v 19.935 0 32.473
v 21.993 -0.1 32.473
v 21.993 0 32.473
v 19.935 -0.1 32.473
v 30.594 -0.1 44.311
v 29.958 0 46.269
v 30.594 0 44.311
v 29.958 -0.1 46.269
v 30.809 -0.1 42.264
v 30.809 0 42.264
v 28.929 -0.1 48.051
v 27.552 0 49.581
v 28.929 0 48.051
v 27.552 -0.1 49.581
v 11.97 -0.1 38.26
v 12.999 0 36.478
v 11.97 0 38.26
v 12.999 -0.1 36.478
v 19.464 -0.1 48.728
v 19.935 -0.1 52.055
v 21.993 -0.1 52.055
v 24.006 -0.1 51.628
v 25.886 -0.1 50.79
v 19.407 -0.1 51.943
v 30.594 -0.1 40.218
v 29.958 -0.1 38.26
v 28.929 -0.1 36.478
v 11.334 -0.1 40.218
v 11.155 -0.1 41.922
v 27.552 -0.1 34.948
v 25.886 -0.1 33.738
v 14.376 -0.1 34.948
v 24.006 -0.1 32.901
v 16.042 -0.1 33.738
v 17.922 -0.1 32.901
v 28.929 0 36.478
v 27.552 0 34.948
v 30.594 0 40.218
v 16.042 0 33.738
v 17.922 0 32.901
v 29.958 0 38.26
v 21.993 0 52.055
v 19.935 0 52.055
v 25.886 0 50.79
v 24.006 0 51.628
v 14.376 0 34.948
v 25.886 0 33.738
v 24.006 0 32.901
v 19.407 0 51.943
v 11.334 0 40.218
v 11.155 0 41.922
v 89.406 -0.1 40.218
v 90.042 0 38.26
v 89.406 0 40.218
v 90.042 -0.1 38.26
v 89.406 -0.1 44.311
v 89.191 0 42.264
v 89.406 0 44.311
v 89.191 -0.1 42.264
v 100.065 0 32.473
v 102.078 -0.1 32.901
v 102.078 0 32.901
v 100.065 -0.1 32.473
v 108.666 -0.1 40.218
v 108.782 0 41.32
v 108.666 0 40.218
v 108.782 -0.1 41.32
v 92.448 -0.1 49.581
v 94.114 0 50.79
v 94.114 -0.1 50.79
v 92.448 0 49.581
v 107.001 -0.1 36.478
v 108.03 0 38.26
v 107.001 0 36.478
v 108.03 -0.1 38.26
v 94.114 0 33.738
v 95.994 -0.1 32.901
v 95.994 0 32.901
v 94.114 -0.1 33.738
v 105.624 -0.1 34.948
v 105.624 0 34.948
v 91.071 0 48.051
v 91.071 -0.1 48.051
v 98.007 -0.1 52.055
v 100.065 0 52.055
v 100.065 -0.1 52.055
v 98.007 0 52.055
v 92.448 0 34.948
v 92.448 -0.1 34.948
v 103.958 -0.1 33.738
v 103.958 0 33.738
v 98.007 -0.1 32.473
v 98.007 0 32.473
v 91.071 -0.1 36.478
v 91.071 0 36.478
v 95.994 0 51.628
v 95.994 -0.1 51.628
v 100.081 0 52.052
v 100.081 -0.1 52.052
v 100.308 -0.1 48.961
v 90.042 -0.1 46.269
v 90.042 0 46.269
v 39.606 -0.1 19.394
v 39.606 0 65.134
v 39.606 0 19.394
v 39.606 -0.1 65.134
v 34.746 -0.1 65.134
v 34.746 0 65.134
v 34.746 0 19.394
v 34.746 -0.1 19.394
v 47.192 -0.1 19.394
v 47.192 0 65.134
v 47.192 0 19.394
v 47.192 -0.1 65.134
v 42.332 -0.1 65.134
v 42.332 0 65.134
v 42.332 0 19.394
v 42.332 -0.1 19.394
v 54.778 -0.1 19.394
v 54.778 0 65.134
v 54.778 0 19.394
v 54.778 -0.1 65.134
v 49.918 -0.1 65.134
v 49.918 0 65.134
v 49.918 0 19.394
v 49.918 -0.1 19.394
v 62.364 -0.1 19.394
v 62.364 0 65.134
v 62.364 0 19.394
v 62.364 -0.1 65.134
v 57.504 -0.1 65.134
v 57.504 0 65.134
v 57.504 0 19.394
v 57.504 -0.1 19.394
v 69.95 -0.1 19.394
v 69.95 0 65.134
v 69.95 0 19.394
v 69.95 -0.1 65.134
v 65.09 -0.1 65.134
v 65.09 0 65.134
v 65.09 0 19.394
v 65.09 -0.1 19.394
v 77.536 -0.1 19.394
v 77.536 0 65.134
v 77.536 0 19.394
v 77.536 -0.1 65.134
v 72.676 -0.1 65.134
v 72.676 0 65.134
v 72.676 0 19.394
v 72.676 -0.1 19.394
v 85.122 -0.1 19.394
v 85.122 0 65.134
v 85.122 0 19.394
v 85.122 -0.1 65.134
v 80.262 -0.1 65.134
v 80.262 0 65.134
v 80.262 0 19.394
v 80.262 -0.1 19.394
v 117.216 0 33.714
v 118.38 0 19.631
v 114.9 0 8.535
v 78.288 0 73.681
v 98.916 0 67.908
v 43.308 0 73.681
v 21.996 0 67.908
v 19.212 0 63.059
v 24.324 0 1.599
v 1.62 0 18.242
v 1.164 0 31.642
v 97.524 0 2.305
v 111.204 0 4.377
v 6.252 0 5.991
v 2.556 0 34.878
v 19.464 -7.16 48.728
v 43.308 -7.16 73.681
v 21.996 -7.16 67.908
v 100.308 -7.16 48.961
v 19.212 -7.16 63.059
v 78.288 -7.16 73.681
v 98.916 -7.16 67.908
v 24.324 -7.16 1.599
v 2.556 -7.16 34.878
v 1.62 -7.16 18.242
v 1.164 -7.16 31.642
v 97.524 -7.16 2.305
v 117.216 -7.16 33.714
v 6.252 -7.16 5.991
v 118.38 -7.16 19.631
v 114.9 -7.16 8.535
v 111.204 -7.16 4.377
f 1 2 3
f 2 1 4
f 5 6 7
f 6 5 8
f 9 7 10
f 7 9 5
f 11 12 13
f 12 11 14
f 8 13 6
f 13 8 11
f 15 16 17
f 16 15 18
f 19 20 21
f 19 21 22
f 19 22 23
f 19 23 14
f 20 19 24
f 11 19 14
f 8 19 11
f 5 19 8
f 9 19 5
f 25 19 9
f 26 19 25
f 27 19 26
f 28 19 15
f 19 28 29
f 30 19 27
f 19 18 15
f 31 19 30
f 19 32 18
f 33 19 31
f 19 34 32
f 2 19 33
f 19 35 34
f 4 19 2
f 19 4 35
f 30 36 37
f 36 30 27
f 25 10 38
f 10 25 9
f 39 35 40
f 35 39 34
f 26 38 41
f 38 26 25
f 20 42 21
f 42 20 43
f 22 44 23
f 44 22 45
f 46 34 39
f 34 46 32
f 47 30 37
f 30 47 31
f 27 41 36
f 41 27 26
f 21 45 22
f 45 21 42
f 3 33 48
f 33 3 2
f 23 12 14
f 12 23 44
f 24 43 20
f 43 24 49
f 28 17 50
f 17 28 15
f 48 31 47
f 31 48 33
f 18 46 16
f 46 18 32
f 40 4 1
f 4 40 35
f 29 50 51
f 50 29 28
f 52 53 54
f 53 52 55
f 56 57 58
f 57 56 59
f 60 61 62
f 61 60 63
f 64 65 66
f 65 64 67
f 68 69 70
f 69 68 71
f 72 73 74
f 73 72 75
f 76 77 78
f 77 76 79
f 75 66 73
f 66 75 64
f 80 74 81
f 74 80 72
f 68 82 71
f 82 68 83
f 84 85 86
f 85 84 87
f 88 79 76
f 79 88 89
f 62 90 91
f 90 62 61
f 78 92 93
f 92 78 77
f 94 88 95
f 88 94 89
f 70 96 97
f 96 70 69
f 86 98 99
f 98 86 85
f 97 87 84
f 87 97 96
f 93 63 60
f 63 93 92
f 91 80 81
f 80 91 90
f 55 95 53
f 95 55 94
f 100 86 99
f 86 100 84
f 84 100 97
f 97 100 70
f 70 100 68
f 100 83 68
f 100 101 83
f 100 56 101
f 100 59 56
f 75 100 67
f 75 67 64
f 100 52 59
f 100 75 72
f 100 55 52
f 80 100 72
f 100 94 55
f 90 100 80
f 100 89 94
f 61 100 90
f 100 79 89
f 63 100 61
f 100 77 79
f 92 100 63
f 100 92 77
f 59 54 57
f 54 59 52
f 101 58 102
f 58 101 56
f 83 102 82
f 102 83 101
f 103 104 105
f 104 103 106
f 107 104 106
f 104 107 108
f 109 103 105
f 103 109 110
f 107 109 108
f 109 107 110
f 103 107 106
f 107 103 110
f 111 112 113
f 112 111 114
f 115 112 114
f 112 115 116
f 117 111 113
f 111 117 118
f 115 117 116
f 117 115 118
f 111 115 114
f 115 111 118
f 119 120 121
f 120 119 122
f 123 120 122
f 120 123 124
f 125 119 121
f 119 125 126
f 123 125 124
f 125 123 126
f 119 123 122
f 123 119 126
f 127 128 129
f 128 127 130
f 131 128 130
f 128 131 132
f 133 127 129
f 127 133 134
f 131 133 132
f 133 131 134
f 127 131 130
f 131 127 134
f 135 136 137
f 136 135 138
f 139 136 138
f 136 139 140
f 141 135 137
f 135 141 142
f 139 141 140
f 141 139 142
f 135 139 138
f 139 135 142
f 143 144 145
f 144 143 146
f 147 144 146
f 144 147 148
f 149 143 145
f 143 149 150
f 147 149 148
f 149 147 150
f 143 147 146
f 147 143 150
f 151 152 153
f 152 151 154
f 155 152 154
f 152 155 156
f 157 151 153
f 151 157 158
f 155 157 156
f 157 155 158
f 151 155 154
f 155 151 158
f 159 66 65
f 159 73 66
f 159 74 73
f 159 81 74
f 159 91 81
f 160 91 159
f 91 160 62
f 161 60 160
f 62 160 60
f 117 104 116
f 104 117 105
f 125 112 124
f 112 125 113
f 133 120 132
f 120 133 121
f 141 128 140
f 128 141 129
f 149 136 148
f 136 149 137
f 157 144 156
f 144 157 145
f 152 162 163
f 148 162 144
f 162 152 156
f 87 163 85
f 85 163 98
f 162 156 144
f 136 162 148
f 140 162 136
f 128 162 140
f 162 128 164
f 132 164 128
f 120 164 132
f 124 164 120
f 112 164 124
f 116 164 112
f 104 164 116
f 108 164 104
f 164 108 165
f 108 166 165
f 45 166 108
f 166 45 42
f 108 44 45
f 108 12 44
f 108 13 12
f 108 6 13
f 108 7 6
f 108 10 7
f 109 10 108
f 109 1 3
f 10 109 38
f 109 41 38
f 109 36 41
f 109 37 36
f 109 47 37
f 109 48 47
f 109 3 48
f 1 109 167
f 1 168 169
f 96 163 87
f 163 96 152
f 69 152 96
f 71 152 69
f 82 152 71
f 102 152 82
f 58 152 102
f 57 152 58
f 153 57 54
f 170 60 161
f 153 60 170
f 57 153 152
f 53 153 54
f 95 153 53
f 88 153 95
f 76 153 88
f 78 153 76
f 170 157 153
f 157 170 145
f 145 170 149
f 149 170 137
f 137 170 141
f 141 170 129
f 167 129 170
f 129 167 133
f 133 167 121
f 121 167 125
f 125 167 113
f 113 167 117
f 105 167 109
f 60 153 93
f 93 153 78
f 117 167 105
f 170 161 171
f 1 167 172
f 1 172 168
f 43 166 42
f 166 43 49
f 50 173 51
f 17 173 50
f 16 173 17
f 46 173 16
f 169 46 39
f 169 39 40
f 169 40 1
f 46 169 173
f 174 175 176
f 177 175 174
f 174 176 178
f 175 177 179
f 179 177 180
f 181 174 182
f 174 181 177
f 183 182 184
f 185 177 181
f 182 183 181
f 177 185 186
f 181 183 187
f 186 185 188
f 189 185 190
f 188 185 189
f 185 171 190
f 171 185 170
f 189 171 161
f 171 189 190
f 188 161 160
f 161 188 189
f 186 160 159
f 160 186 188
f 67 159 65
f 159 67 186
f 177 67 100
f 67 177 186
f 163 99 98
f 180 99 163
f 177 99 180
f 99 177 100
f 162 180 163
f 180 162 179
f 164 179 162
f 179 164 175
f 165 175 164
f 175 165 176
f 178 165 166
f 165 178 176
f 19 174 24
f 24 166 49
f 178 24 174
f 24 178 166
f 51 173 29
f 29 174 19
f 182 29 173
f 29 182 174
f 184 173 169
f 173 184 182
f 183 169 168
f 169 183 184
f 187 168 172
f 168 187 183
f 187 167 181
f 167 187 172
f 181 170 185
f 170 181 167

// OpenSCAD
/* doodle-meta {"version":1,"parameters":{"width":{"label":"Overall width","description":"Changes the body width","unit":"mm","feature":"body_width"},"height":{"label":"Overall height","description":"Changes the body height","unit":"mm","feature":"body_height"},"depth":{"label":"Overall depth","description":"Changes the body depth","unit":"mm","feature":"body_depth"},"slot_count":{"label":"Grille slot count","description":"Number of vertical grille slots","unit":"count","feature":"grille_slots"},"slot_width":{"label":"Grille slot width","description":"Width of each vertical grille slot","unit":"mm","feature":"grille_slots"},"slot_height":{"label":"Grille slot height","description":"Height of each vertical grille slot","unit":"mm","feature":"grille_slots"},"headlight_diameter":{"label":"Headlight diameter","description":"Diameter of the circular headlight cutouts","unit":"mm","feature":"headlights"}},"features":{"body_width":{"kind":"dimension","axis":"x","label":"Overall width"},"body_height":{"kind":"dimension","axis":"z","label":"Overall height"},"body_depth":{"kind":"dimension","axis":"y","label":"Overall depth"},"grille_slots":{"kind":"region","label":"Grille slots","min":[{"parameter":"width","scale":0.2895},{"parameter":"depth","scale":0,"offset":0},{"parameter":"height","scale":0.1324}],"max":[{"parameter":"width","scale":0.7027},{"parameter":"depth","scale":1,"offset":0},{"parameter":"height","scale":0.7417}]},"headlights":{"kind":"region","label":"Headlights","min":[{"parameter":"width","scale":0.0927},{"parameter":"depth","scale":0,"offset":0},{"parameter":"height","scale":0.4893}],"max":[{"parameter":"width","scale":0.9035},{"parameter":"depth","scale":1,"offset":0},{"parameter":"height","scale":0.7509}]}}} */

// Parameters
width = 120.0;
height = 75.07;
depth = 7.16;
slot_count = 7;
slot_width = 4.86;
slot_height = 45.74;
headlight_diameter = 19.69;

// Derived constants
eps = 0.1;

// Front view outer profile polygon (normalized u, v)
// Mapped to CAD: X = u * width, Z = (1 - v) * height
front_profile_norm = [
    [0.0097, 0.5785],
    [0.0135, 0.757],
    [0.0521, 0.9202],
    [0.2027, 0.9787],
    [0.8127, 0.9693],
    [0.9267, 0.9417],
    [0.9575, 0.8863],
    [0.9865, 0.7385],
    [0.9768, 0.5509],
    [0.8359, 0.3478],
    [0.8243, 0.0954],
    [0.6524, 0.0185],
    [0.3609, 0.0185],
    [0.1833, 0.0954],
    [0.1601, 0.16],
    [0.1622, 0.3509],
    [0.0213, 0.5354]
];

// Convert normalized front profile to CAD coordinates (X, Z)
function front_profile_cad(p) = [p[0] * width, (1 - p[1]) * height];

// Generate CAD polygon points
front_poly_cad = [for (p = front_profile_norm) front_profile_cad(p)];

// Top view outer profile polygon (normalized u, v)
// Mapped to CAD: X = u * width, Y = (1 - v) * depth
top_profile_norm = [
    [0.0096, 0.2255],
    [0.0115, 0.7086],
    [0.8944, 0.8064],
    [0.9732, 0.7725],
    [0.9866, 0.5469],
    [0.9789, 0.2255],
    [0.9501, 0.1597]
];

// Convert normalized top profile to CAD coordinates (X, Y)
function top_profile_cad(p) = [p[0] * width, (1 - p[1]) * depth];

// Generate CAD polygon points for top view
top_poly_cad = [for (p = top_profile_norm) top_profile_cad(p)];

// Headlight centers in CAD coordinates
// Left headlight: center_view_normalized [0.1747, 0.437]
// X = 0.1747 * width, Z = (1 - 0.437) * height
headlight_left_x = 0.1747 * width;
headlight_left_z = (1 - 0.437) * height;

// Right headlight: center_view_normalized [0.8253, 0.437]
// X = 0.8253 * width, Z = (1 - 0.437) * height
headlight_right_x = 0.8253 * width;
headlight_right_z = (1 - 0.437) * height;

// Grille slots parameters
// Slots are centered vertically in the front view.
// Center v = 0.437 -> Z_center = (1 - 0.437) * height
// Slot height is slot_height.
// Slot width is slot_width.
// Slots are distributed horizontally.
// The slots span from u=0.2895 to u=0.7027 roughly (based on bounding boxes of contours).
// Let's calculate the start and end X for the slot array.
// Leftmost slot center u ~ 0.3098, Rightmost slot center u ~ 0.6891.
// Spacing between centers: (0.6891 - 0.3098) / (7 - 1) = 0.3793 / 6 = 0.063216
// First slot center X = 0.3098 * width
// Last slot center X = 0.6891 * width

slot_start_u = 0.3098;
slot_end_u = 0.6891;
slot_pitch_u = (slot_end_u - slot_start_u) / (slot_count - 1);

// Module for the main body
module grille_body() {
    // Create the 3D body by extruding the front profile along Y
    // The front profile is in XZ plane. Extrude along Y.
    // We need to create a polygon in XZ and extrude it along Y.
    // However, OpenSCAD's linear_extrude works on XY plane by default.
    // So we create the polygon in XY (where X is width, Y is height), then rotate it to XZ.
    
    // Create polygon in XY plane (X=width, Y=height)
    // Points are (X, Z) from front_profile_cad
    // We need to map (X, Z) to (X, Y) for linear_extrude, then rotate.
    // Actually, simpler: define polygon in XZ directly by swapping Y/Z in the polygon definition?
    // No, polygon() takes 2D points.
    // Let's define the polygon in XZ coordinates as (x, z).
    // Then use linear_extrude with convexity and rotate the whole thing?
    // Or better: define polygon in XY where Y represents Z.
    // Then rotate([90, 0, 0]) to put it in XZ plane.
    
    // Points for polygon in XY (X, Y=Z)
    poly_pts = [for (p = front_poly_cad) [p[0], p[1]]];
    
    // Extrude along Z (which will become Y after rotation)
    // Wait, if I extrude along Z, the thickness is in Z.
    // I want thickness in Y.
    // So:
    // 1. Define polygon in XZ (x, z).
    // 2. linear_extrude along Y? No, linear_extrude is always along Z.
    // 3. So define polygon in XY (x, y=z).
    // 4. linear_extrude along Z (thickness).
    // 5. Rotate([90, 0, 0]) to swap Y and Z.
    //    Original: X=width, Y=height, Z=thickness.
    //    After rotate([90,0,0]): X=width, Y=-thickness, Z=height.
    //    This puts the face in XZ plane, thickness in Y.
    
    translate([0, 0, 0])
    rotate([90, 0, 0])
    linear_extrude(height = depth, convexity = 10)
    polygon(points = poly_pts);
}

// Module for headlight cutouts
module headlight_cutouts() {
    // Left headlight
    // Cylinder axis along Y.
    // Position: X = headlight_left_x, Z = headlight_left_z, Y = depth/2 (centered)
    // Rotate([90, 0, 0]) makes cylinder axis along Y.
    // Center the cylinder in Y.
    translate([headlight_left_x, depth/2, headlight_left_z])
    rotate([90, 0, 0])
    cylinder(h = depth + 2*eps, d = headlight_diameter, center = true);

    // Right headlight
    translate([headlight_right_x, depth/2, headlight_right_z])
    rotate([90, 0, 0])
    cylinder(h = depth + 2*eps, d = headlight_diameter, center = true);
}

// Module for grille slot cutouts
module grille_slot_cutouts() {
    // Slots are vertical rectangles in XZ plane, cut along Y.
    // Use cubes.
    // Cube dimensions: X=slot_width, Y=depth+2*eps, Z=slot_height.
    // Centered in Y.
    // Positioned at specific X and Z.
    
    // Z center for slots: (1 - 0.437) * height
    slot_z_center = (1 - 0.437) * height;
    
    for (i = [0 : slot_count - 1]) {
        // Calculate X center for each slot
        slot_u_center = slot_start_u + i * slot_pitch_u;
        slot_x_center = slot_u_center * width;
        
        translate([slot_x_center, depth/2, slot_z_center])
        cube([slot_width, depth + 2*eps, slot_height], center = true);
    }
}

// Main assembly
difference() {
    grille_body();
    headlight_cutouts();
    grille_slot_cutouts();
}
